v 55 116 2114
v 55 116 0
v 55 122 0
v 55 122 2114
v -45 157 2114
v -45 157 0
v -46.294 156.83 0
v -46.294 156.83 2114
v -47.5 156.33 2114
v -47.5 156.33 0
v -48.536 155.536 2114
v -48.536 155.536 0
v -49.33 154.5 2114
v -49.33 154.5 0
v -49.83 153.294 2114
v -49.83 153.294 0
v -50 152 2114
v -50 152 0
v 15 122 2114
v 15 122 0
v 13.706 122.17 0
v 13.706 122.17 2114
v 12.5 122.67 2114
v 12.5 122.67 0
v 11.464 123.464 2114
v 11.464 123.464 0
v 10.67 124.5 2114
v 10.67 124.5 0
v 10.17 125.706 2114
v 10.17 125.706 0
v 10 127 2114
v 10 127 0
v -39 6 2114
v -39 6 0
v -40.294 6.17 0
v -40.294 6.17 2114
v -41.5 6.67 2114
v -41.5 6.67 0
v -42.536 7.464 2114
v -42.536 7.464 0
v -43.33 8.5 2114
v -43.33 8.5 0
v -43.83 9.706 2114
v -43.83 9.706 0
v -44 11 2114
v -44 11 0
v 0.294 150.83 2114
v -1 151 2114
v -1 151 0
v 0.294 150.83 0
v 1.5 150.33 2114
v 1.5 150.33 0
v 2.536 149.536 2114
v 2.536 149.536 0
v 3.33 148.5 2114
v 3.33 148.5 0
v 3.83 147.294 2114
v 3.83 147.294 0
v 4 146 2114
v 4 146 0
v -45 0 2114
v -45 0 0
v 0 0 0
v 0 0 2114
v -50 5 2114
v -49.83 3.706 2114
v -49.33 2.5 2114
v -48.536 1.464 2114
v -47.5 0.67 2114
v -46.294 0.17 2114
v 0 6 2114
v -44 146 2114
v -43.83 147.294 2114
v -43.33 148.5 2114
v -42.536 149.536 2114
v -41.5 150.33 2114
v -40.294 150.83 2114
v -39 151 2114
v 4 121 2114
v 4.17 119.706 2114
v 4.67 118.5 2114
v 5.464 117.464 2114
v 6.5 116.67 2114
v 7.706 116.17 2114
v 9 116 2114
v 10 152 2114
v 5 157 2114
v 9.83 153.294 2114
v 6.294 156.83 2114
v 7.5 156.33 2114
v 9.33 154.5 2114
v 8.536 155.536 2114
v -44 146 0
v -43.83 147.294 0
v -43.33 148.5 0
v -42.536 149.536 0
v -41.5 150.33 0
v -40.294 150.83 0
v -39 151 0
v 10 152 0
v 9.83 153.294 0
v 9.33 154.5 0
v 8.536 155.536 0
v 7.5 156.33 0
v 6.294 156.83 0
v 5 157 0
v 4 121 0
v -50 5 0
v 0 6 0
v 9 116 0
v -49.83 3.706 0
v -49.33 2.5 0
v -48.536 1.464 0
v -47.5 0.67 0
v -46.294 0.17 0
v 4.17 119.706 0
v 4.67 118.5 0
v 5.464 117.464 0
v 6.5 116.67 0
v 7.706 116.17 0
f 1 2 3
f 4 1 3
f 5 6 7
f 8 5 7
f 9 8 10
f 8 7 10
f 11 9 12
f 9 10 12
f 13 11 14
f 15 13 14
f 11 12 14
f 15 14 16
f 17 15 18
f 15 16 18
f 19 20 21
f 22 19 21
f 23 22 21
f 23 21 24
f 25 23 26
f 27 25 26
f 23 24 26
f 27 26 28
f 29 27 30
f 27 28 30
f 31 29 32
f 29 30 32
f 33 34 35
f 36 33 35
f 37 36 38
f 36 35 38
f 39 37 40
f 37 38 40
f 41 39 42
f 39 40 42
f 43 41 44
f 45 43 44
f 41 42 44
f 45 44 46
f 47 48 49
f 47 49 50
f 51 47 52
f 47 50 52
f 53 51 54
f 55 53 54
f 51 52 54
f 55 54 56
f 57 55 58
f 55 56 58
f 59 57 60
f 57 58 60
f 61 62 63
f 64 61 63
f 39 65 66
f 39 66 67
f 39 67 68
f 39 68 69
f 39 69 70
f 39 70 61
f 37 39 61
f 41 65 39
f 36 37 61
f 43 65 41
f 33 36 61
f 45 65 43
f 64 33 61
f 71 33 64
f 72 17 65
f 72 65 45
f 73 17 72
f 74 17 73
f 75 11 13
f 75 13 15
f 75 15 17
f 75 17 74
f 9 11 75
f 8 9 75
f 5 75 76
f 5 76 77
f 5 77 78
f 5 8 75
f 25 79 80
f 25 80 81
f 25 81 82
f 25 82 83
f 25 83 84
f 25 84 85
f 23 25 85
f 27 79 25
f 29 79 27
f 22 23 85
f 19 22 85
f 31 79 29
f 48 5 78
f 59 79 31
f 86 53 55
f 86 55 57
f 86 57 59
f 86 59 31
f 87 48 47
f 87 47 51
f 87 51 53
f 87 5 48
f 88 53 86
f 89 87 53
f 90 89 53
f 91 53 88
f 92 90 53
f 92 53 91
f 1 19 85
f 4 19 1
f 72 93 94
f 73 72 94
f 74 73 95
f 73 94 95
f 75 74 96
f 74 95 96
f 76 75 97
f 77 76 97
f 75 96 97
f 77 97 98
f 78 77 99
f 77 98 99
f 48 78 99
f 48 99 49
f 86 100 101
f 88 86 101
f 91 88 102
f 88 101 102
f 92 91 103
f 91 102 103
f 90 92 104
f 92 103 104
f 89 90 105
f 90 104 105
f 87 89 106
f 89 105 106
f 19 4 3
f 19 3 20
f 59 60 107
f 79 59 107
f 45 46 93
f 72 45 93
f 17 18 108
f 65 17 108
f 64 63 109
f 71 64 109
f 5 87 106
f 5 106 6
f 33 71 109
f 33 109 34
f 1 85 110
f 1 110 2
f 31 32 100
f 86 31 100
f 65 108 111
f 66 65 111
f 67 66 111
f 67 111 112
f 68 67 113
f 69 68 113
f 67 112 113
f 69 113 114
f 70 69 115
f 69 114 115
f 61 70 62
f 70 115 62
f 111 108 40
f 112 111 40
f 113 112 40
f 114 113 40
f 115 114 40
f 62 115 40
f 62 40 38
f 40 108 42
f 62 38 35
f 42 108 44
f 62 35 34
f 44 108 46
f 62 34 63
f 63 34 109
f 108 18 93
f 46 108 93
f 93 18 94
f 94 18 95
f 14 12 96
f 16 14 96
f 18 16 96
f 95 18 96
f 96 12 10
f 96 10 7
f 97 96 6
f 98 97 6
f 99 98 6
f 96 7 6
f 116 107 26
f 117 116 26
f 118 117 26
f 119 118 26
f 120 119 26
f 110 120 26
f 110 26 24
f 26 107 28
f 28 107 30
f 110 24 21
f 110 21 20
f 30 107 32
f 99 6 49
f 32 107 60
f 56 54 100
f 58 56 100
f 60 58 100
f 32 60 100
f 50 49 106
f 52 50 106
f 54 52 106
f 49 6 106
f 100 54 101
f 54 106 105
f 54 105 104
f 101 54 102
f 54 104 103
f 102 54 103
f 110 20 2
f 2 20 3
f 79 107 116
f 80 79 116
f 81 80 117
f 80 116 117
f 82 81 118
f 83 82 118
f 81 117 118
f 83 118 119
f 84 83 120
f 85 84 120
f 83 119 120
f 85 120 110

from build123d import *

# Parameters (mm, degrees)
F1_DEPTH = 2114


with BuildPart() as f1:
    # F0 (on Top) → F1 (new body)
    with BuildSketch(Plane.XY):
        with BuildLine():
            Line((-45, 0), (0, 0))
            Line((0, 0), (0, 6))
            Line((0, 6), (-39, 6))
            ThreePointArc((-39, 6), (-42.535534, 7.464466), (-44, 11))
            Line((-44, 11), (-44, 146))
            ThreePointArc((-44, 146), (-42.535534, 149.535534), (-39, 151))
            Line((-39, 151), (-1, 151))
            ThreePointArc((-1, 151), (2.535534, 149.535534), (4, 146))
            Line((4, 146), (4, 121))
            ThreePointArc((4, 121), (5.464466, 117.464466), (9, 116))
            Line((9, 116), (55, 116))
            Line((55, 116), (55, 122))
            Line((55, 122), (15, 122))
            ThreePointArc((15, 122), (11.464466, 123.464466), (10, 127))
            Line((10, 127), (10, 152))
            ThreePointArc((10, 152), (8.535534, 155.535534), (5, 157))
            Line((5, 157), (-45, 157))
            ThreePointArc((-45, 157), (-48.535534, 155.535534), (-50, 152))
            Line((-50, 152), (-50, 5))
            ThreePointArc((-50, 5), (-48.535534, 1.464466), (-45, 0))
        make_face()
    extrude(amount=F1_DEPTH)


solid = f1.part
